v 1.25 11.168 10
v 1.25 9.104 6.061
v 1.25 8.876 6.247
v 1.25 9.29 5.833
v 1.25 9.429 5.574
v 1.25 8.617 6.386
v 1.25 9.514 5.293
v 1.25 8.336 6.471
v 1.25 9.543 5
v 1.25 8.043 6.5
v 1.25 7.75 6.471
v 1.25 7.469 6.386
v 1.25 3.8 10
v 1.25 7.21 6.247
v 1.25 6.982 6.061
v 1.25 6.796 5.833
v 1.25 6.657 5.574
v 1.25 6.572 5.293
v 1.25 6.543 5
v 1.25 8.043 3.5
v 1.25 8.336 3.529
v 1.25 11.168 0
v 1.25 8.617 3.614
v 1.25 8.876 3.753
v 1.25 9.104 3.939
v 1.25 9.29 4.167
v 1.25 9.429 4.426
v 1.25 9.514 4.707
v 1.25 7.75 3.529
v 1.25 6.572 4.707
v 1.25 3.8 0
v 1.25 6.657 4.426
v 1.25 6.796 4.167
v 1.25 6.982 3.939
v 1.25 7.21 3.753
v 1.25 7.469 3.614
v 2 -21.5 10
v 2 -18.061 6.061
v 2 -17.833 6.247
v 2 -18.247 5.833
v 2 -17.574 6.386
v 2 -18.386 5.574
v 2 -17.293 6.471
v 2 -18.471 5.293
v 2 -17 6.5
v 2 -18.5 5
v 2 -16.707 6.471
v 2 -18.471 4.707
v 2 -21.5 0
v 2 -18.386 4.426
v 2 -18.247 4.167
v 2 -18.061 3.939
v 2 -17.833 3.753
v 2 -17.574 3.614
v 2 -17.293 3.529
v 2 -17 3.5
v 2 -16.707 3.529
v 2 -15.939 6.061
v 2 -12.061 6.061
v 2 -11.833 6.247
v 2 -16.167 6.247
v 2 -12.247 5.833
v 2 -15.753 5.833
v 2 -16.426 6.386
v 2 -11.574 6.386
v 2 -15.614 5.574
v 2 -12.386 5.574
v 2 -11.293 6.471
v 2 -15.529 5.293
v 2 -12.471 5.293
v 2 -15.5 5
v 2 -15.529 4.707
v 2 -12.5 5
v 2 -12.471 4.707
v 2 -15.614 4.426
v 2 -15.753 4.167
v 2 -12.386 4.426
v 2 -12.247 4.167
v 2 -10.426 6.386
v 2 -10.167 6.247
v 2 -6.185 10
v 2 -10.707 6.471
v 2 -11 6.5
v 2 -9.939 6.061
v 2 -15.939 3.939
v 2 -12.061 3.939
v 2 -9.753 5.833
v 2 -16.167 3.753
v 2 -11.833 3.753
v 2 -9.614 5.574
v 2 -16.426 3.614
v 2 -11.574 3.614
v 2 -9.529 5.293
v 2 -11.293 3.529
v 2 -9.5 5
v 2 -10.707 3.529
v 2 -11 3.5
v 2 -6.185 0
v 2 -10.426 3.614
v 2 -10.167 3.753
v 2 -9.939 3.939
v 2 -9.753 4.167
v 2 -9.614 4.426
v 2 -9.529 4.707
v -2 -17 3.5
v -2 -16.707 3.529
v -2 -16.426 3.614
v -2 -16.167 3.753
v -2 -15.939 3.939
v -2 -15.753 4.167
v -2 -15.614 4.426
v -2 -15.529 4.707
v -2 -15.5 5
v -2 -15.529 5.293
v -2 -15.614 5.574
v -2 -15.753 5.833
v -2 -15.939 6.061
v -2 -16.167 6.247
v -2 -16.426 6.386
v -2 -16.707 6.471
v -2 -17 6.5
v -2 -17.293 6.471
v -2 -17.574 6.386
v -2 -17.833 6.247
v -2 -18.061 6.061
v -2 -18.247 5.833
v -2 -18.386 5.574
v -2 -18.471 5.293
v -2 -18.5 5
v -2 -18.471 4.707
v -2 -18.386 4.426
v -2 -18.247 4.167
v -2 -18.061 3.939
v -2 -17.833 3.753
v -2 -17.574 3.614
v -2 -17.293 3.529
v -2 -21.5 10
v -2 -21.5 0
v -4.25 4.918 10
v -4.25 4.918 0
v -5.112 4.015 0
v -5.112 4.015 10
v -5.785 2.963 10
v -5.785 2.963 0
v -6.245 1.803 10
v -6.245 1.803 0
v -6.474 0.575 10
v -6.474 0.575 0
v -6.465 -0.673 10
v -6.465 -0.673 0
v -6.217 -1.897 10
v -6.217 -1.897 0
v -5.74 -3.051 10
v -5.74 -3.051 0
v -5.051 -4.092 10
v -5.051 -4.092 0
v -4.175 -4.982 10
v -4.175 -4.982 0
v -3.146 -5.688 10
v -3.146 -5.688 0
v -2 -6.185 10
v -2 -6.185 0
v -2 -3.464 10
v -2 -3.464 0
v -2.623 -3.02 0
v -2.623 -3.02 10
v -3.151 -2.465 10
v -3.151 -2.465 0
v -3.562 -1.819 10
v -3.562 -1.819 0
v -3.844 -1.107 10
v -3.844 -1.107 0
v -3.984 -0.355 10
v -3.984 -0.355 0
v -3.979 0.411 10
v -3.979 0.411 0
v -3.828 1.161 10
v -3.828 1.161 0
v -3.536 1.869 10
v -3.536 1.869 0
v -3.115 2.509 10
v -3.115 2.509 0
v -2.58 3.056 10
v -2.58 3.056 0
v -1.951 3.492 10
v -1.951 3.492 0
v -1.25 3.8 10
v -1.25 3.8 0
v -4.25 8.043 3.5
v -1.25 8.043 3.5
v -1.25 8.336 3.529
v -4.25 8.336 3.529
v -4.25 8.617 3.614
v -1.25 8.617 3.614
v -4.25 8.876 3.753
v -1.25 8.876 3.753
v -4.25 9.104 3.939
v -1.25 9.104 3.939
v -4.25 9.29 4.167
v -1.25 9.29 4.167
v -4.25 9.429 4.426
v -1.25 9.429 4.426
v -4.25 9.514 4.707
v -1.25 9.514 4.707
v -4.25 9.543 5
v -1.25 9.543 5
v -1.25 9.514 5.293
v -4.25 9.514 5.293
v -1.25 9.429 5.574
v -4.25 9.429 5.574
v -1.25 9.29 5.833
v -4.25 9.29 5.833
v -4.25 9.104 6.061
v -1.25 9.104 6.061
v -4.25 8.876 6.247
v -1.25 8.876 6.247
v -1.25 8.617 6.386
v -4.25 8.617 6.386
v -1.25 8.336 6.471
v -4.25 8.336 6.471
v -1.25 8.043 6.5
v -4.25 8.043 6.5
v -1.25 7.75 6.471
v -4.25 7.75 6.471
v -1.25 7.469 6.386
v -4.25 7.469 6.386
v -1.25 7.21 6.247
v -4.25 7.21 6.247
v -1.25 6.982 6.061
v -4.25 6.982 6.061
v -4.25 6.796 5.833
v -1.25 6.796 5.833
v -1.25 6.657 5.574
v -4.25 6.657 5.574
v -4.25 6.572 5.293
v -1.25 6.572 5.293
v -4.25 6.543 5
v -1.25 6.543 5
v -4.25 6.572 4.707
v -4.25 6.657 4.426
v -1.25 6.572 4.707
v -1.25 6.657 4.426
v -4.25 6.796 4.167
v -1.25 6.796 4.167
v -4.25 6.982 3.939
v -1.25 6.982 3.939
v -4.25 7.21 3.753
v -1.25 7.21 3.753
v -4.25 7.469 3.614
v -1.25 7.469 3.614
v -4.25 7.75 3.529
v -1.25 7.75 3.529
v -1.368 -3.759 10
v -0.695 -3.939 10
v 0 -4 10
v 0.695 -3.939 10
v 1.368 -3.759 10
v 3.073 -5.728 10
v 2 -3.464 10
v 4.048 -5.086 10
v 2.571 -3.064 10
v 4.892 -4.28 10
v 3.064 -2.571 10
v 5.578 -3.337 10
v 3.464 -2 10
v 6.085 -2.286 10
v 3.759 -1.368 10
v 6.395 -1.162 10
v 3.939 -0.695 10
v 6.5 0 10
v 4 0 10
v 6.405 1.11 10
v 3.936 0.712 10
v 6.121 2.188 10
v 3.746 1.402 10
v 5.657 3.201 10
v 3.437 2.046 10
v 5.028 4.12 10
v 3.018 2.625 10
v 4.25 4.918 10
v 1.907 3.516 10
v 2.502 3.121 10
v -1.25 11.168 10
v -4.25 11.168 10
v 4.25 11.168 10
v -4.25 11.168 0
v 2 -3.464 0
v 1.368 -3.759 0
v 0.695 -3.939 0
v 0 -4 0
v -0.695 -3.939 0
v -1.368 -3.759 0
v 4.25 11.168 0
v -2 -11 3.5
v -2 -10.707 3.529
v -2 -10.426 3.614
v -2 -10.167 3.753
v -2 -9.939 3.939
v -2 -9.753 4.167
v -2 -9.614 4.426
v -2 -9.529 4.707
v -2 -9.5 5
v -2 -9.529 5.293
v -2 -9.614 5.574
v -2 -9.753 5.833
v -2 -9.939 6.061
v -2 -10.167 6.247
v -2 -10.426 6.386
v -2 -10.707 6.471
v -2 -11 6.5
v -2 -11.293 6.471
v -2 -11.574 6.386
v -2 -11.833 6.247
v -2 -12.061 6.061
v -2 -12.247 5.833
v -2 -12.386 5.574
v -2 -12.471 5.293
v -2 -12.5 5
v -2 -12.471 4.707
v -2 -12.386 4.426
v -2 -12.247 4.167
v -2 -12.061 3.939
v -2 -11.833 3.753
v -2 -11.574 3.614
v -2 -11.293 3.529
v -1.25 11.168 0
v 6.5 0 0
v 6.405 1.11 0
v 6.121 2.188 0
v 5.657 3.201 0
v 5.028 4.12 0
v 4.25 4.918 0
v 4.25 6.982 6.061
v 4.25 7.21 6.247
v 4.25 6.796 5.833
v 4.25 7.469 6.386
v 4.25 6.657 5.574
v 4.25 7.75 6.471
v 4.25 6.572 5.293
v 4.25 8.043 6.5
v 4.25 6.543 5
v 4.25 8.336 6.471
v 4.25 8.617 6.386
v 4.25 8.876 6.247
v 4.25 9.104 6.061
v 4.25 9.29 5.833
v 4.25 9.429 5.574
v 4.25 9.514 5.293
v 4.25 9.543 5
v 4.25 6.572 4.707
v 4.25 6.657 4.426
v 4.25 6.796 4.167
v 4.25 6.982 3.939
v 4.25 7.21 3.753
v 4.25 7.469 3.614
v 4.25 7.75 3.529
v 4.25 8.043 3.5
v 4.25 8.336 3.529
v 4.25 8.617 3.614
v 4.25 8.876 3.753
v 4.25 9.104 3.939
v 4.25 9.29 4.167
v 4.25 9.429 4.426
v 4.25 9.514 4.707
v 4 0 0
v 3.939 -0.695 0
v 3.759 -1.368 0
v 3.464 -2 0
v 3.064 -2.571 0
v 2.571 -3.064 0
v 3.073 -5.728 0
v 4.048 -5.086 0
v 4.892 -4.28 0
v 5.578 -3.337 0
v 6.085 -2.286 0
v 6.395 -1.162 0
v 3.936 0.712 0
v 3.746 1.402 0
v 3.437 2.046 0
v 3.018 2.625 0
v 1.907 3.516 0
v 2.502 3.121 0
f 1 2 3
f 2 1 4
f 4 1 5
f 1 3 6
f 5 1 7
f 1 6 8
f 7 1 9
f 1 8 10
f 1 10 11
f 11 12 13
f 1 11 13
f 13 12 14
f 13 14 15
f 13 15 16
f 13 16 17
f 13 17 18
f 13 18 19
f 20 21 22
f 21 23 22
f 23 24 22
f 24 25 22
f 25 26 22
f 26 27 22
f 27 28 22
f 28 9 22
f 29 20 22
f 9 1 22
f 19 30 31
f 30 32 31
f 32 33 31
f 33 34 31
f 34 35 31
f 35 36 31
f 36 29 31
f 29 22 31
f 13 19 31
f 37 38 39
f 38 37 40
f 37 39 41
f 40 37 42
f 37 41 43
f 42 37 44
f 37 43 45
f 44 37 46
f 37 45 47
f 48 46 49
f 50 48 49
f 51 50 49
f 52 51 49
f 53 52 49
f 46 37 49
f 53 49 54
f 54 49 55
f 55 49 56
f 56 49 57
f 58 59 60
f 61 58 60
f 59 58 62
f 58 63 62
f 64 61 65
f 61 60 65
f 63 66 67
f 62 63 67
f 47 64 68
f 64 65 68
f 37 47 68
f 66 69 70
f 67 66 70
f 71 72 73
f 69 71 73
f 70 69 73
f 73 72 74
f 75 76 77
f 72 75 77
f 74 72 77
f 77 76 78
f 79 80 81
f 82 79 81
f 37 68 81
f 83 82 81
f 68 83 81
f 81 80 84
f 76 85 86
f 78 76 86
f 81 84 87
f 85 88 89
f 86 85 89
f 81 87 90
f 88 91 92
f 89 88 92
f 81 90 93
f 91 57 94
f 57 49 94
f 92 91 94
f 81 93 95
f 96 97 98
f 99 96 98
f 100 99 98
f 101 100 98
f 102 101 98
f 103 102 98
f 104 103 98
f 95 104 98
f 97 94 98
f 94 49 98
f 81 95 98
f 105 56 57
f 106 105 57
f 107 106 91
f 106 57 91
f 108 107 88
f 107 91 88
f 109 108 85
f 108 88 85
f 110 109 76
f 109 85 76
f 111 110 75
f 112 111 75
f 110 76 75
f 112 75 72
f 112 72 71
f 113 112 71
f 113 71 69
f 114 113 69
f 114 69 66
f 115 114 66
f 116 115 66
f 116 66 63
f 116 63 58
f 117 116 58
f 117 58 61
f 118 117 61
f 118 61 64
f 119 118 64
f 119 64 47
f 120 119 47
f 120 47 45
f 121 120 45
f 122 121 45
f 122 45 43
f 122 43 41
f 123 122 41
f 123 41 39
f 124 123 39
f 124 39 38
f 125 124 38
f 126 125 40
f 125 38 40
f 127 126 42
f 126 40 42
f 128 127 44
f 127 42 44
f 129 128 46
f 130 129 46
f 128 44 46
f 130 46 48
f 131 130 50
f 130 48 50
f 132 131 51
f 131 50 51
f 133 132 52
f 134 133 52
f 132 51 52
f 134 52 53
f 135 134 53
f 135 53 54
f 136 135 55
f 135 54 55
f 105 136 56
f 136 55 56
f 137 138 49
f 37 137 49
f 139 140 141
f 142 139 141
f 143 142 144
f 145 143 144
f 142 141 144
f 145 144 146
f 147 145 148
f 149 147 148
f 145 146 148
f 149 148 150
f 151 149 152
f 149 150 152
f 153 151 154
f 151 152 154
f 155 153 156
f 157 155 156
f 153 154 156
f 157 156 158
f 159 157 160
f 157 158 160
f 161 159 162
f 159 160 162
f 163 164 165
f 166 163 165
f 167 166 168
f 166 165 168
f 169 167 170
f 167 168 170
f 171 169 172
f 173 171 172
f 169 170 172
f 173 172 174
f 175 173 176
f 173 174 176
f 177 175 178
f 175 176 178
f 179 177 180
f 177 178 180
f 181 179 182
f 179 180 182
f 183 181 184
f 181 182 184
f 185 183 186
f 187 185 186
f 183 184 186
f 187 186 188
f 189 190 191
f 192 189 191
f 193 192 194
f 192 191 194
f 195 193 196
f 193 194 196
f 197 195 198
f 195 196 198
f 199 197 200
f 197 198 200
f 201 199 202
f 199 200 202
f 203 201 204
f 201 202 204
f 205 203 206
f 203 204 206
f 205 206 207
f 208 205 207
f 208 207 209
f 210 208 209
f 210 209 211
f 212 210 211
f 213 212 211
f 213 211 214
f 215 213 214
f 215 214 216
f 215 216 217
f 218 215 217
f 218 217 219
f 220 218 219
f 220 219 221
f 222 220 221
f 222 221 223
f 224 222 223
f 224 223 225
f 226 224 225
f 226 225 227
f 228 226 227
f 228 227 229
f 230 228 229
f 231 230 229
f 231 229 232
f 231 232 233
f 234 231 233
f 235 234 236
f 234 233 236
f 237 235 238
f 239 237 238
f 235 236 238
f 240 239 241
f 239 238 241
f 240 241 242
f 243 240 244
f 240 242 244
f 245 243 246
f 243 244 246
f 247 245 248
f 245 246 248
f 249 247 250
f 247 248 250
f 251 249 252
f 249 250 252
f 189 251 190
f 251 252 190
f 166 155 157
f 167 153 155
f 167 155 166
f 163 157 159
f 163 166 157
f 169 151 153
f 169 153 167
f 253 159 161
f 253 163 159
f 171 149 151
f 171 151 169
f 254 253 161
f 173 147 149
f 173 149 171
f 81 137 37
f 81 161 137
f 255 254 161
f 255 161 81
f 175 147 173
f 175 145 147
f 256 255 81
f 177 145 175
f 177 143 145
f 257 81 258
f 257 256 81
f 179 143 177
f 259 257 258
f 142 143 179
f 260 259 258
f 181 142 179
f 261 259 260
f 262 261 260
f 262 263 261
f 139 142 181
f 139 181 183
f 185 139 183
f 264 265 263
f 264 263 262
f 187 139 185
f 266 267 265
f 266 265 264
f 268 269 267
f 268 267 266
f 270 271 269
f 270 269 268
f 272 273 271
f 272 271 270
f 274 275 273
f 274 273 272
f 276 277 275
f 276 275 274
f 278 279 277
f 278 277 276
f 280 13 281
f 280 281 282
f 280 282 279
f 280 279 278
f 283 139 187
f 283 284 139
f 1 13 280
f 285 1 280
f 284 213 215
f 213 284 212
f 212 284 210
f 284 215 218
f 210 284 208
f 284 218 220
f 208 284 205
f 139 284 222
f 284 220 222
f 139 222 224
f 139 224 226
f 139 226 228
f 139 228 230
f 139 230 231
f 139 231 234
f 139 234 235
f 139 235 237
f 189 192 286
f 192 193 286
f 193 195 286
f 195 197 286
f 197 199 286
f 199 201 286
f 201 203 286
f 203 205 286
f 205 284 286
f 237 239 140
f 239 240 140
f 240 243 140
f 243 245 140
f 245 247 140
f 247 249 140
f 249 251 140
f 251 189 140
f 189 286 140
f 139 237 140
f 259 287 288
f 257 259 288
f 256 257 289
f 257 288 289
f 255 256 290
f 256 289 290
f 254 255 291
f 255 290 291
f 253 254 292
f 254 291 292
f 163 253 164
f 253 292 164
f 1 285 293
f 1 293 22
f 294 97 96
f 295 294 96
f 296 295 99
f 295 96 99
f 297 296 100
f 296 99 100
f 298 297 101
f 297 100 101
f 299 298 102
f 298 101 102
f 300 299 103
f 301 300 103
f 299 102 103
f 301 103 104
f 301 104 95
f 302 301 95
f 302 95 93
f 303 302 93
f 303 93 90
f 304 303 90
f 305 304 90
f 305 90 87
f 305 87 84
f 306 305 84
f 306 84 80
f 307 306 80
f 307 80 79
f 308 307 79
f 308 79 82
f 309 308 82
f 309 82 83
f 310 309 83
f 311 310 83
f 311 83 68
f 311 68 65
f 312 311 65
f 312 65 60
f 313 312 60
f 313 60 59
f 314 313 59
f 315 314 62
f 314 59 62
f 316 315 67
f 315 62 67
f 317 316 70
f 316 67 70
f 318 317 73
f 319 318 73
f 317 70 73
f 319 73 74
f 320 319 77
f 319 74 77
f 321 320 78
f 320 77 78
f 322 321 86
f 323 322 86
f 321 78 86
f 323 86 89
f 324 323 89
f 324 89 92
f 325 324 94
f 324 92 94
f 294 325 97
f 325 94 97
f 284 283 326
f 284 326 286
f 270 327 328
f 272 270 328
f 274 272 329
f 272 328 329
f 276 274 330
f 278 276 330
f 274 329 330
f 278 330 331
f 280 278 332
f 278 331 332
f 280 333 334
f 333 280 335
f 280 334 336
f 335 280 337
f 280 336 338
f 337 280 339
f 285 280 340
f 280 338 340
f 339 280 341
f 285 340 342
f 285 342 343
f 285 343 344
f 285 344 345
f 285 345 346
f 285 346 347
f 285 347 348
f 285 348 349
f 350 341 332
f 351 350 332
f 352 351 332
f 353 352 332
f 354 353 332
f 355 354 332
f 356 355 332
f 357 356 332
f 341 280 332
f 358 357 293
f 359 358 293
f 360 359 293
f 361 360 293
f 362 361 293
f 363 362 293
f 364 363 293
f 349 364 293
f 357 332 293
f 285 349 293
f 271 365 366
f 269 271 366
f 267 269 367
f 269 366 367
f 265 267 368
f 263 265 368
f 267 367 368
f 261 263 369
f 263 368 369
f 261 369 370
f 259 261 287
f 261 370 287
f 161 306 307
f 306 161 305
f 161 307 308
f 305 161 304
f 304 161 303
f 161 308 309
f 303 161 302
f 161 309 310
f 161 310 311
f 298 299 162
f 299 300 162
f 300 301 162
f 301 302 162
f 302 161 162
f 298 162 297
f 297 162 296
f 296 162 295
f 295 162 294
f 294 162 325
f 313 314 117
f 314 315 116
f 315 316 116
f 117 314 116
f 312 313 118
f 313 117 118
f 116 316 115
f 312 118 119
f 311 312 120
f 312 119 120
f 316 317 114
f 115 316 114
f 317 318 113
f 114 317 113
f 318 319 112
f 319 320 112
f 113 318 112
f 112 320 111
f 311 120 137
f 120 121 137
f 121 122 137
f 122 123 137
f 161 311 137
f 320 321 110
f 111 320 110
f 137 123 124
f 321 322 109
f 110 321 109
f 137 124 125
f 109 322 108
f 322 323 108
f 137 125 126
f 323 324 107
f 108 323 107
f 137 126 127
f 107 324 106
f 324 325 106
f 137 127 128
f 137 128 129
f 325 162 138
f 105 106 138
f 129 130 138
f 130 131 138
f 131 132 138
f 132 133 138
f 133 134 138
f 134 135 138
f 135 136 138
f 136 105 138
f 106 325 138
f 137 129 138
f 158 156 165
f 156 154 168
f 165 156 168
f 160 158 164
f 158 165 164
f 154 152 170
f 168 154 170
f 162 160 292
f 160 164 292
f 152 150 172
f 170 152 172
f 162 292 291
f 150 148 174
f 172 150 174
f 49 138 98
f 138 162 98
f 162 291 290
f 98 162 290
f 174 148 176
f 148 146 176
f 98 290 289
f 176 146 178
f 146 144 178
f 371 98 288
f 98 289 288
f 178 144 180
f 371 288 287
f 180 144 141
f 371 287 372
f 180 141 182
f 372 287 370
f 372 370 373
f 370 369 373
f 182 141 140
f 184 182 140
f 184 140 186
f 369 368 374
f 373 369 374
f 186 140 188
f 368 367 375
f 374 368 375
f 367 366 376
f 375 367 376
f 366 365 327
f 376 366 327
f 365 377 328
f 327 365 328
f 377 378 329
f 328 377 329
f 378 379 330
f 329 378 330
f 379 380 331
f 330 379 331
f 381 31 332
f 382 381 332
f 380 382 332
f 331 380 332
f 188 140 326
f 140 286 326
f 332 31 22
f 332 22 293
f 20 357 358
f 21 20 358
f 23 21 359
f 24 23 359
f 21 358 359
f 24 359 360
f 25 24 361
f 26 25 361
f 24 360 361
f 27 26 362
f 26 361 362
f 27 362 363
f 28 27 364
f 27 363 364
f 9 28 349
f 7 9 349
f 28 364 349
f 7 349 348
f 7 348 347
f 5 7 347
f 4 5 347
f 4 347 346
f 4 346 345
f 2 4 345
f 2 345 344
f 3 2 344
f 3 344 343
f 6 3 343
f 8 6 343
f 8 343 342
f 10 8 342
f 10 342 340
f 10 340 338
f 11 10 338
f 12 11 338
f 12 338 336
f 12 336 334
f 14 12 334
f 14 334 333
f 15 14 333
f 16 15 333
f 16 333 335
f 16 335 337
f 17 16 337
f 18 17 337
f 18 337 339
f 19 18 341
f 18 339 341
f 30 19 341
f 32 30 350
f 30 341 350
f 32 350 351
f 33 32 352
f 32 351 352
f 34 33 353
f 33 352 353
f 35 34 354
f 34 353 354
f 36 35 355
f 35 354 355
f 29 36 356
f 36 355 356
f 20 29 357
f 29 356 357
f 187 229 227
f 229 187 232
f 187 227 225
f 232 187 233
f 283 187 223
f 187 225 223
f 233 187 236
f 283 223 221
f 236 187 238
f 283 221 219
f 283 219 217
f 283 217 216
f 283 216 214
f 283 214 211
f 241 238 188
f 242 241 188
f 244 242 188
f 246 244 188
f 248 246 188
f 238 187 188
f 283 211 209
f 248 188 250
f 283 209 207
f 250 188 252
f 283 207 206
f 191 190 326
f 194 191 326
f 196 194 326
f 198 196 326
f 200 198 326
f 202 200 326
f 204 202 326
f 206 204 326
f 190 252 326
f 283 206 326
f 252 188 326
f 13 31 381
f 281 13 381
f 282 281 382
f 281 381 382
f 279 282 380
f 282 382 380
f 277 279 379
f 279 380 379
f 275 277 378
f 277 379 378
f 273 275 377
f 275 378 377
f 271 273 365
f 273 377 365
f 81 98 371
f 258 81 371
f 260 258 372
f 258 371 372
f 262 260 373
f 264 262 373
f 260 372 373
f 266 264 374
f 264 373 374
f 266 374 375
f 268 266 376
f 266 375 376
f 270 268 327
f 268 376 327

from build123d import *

# Parameters (mm, degrees)
BOSS_EXTRUDE1_DEPTH     = 10
SKETCH2_R               = 1.5
CUT_EXTRUDE1_DEPTH      = 3.25
CUT_EXTRUDE1_DEPTH_BACK = 11.75


with BuildPart() as part:
    # Sketch1 → Boss-Extrude1 (new body)
    with BuildSketch(Plane.XY):
        with BuildLine():
            ThreePointArc((2, -6.184658438), (0, -6.5), (-2, -6.184658438))
            Line((-2, -6.184658438), (-2, -21.5))
            Line((-2, -21.5), (2, -21.5))
            Line((2, -21.5), (2, -6.184658438))
        make_face()
        with BuildLine():
            Line((-2, -3.464101615), (-2, -6.184658438))
            ThreePointArc((-2, -6.184658438), (0, -6.5), (2, -6.184658438))
            Line((2, -6.184658438), (2, -3.464101615))
            ThreePointArc((2, -3.464101615), (0, -4), (-2, -3.464101615))
        make_face()
        with BuildLine():
            ThreePointArc((-1.25, 6.378675411), (-2.84531818, 5.844156436), (-4.25, 4.918078893))
            ThreePointArc((-4.25, 4.918078893), (-6.370503831, -1.290999975), (-2, -6.184658438))
            Line((-2, -6.184658438), (-2, -3.464101615))
            ThreePointArc((-2, -3.464101615), (-3.97884698, 0.410824427), (-1.25, 3.799671038))
            Line((-1.25, 3.799671038), (-1.25, 6.378675411))
        make_face()
        with BuildLine():
            ThreePointArc((4.25, 4.918078893), (2.84531818, 5.844156436), (1.25, 6.378675411))
            Line((1.25, 6.378675411), (1.25, 3.799671038))
            ThreePointArc((1.25, 3.799671038), (3.240370349, 2.34520788), (4, 0))
            ThreePointArc((4, 0), (3.464101615, -2), (2, -3.464101615))
            Line((2, -3.464101615), (2, -6.184658438))
            ThreePointArc((2, -6.184658438), (5.25594901, -3.824264635), (6.5, 0))
            ThreePointArc((6.5, 0), (5.910795209, 2.704163457), (4.25, 4.918078893))
        make_face()
        with BuildLine():
            Line((1.25, 11.168078893), (1.25, 6.378675411))
            ThreePointArc((1.25, 6.378675411), (2.84531818, 5.844156436), (4.25, 4.918078893))
            Line((4.25, 4.918078893), (4.25, 11.168078893))
            Line((4.25, 11.168078893), (1.25, 11.168078893))
        make_face()
        with BuildLine():
            Line((-4.25, 11.168078893), (-4.25, 4.918078893))
            ThreePointArc((-4.25, 4.918078893), (-2.84531818, 5.844156436), (-1.25, 6.378675411))
            Line((-1.25, 6.378675411), (-1.25, 11.168078893))
            Line((-1.25, 11.168078893), (-4.25, 11.168078893))
        make_face()
    extrude(amount=BOSS_EXTRUDE1_DEPTH)

    # Sketch2 → Cut-Extrude1 (cut, two sides)
    with BuildSketch(Plane(origin=(4.25, 0, 0), x_dir=(0, 0, -1), z_dir=(1, 0, 0))) as cut_extrude1_sk:
        with Locations((-5, 8.043078893)):
            Circle(SKETCH2_R)
        with Locations((-5, -17)):
            Circle(SKETCH2_R)
        with Locations((-5, -11)):
            Circle(SKETCH2_R)
    extrude(amount=CUT_EXTRUDE1_DEPTH, mode=Mode.SUBTRACT)
    extrude(cut_extrude1_sk.sketch, amount=-CUT_EXTRUDE1_DEPTH_BACK, mode=Mode.SUBTRACT)


solid = part.part
